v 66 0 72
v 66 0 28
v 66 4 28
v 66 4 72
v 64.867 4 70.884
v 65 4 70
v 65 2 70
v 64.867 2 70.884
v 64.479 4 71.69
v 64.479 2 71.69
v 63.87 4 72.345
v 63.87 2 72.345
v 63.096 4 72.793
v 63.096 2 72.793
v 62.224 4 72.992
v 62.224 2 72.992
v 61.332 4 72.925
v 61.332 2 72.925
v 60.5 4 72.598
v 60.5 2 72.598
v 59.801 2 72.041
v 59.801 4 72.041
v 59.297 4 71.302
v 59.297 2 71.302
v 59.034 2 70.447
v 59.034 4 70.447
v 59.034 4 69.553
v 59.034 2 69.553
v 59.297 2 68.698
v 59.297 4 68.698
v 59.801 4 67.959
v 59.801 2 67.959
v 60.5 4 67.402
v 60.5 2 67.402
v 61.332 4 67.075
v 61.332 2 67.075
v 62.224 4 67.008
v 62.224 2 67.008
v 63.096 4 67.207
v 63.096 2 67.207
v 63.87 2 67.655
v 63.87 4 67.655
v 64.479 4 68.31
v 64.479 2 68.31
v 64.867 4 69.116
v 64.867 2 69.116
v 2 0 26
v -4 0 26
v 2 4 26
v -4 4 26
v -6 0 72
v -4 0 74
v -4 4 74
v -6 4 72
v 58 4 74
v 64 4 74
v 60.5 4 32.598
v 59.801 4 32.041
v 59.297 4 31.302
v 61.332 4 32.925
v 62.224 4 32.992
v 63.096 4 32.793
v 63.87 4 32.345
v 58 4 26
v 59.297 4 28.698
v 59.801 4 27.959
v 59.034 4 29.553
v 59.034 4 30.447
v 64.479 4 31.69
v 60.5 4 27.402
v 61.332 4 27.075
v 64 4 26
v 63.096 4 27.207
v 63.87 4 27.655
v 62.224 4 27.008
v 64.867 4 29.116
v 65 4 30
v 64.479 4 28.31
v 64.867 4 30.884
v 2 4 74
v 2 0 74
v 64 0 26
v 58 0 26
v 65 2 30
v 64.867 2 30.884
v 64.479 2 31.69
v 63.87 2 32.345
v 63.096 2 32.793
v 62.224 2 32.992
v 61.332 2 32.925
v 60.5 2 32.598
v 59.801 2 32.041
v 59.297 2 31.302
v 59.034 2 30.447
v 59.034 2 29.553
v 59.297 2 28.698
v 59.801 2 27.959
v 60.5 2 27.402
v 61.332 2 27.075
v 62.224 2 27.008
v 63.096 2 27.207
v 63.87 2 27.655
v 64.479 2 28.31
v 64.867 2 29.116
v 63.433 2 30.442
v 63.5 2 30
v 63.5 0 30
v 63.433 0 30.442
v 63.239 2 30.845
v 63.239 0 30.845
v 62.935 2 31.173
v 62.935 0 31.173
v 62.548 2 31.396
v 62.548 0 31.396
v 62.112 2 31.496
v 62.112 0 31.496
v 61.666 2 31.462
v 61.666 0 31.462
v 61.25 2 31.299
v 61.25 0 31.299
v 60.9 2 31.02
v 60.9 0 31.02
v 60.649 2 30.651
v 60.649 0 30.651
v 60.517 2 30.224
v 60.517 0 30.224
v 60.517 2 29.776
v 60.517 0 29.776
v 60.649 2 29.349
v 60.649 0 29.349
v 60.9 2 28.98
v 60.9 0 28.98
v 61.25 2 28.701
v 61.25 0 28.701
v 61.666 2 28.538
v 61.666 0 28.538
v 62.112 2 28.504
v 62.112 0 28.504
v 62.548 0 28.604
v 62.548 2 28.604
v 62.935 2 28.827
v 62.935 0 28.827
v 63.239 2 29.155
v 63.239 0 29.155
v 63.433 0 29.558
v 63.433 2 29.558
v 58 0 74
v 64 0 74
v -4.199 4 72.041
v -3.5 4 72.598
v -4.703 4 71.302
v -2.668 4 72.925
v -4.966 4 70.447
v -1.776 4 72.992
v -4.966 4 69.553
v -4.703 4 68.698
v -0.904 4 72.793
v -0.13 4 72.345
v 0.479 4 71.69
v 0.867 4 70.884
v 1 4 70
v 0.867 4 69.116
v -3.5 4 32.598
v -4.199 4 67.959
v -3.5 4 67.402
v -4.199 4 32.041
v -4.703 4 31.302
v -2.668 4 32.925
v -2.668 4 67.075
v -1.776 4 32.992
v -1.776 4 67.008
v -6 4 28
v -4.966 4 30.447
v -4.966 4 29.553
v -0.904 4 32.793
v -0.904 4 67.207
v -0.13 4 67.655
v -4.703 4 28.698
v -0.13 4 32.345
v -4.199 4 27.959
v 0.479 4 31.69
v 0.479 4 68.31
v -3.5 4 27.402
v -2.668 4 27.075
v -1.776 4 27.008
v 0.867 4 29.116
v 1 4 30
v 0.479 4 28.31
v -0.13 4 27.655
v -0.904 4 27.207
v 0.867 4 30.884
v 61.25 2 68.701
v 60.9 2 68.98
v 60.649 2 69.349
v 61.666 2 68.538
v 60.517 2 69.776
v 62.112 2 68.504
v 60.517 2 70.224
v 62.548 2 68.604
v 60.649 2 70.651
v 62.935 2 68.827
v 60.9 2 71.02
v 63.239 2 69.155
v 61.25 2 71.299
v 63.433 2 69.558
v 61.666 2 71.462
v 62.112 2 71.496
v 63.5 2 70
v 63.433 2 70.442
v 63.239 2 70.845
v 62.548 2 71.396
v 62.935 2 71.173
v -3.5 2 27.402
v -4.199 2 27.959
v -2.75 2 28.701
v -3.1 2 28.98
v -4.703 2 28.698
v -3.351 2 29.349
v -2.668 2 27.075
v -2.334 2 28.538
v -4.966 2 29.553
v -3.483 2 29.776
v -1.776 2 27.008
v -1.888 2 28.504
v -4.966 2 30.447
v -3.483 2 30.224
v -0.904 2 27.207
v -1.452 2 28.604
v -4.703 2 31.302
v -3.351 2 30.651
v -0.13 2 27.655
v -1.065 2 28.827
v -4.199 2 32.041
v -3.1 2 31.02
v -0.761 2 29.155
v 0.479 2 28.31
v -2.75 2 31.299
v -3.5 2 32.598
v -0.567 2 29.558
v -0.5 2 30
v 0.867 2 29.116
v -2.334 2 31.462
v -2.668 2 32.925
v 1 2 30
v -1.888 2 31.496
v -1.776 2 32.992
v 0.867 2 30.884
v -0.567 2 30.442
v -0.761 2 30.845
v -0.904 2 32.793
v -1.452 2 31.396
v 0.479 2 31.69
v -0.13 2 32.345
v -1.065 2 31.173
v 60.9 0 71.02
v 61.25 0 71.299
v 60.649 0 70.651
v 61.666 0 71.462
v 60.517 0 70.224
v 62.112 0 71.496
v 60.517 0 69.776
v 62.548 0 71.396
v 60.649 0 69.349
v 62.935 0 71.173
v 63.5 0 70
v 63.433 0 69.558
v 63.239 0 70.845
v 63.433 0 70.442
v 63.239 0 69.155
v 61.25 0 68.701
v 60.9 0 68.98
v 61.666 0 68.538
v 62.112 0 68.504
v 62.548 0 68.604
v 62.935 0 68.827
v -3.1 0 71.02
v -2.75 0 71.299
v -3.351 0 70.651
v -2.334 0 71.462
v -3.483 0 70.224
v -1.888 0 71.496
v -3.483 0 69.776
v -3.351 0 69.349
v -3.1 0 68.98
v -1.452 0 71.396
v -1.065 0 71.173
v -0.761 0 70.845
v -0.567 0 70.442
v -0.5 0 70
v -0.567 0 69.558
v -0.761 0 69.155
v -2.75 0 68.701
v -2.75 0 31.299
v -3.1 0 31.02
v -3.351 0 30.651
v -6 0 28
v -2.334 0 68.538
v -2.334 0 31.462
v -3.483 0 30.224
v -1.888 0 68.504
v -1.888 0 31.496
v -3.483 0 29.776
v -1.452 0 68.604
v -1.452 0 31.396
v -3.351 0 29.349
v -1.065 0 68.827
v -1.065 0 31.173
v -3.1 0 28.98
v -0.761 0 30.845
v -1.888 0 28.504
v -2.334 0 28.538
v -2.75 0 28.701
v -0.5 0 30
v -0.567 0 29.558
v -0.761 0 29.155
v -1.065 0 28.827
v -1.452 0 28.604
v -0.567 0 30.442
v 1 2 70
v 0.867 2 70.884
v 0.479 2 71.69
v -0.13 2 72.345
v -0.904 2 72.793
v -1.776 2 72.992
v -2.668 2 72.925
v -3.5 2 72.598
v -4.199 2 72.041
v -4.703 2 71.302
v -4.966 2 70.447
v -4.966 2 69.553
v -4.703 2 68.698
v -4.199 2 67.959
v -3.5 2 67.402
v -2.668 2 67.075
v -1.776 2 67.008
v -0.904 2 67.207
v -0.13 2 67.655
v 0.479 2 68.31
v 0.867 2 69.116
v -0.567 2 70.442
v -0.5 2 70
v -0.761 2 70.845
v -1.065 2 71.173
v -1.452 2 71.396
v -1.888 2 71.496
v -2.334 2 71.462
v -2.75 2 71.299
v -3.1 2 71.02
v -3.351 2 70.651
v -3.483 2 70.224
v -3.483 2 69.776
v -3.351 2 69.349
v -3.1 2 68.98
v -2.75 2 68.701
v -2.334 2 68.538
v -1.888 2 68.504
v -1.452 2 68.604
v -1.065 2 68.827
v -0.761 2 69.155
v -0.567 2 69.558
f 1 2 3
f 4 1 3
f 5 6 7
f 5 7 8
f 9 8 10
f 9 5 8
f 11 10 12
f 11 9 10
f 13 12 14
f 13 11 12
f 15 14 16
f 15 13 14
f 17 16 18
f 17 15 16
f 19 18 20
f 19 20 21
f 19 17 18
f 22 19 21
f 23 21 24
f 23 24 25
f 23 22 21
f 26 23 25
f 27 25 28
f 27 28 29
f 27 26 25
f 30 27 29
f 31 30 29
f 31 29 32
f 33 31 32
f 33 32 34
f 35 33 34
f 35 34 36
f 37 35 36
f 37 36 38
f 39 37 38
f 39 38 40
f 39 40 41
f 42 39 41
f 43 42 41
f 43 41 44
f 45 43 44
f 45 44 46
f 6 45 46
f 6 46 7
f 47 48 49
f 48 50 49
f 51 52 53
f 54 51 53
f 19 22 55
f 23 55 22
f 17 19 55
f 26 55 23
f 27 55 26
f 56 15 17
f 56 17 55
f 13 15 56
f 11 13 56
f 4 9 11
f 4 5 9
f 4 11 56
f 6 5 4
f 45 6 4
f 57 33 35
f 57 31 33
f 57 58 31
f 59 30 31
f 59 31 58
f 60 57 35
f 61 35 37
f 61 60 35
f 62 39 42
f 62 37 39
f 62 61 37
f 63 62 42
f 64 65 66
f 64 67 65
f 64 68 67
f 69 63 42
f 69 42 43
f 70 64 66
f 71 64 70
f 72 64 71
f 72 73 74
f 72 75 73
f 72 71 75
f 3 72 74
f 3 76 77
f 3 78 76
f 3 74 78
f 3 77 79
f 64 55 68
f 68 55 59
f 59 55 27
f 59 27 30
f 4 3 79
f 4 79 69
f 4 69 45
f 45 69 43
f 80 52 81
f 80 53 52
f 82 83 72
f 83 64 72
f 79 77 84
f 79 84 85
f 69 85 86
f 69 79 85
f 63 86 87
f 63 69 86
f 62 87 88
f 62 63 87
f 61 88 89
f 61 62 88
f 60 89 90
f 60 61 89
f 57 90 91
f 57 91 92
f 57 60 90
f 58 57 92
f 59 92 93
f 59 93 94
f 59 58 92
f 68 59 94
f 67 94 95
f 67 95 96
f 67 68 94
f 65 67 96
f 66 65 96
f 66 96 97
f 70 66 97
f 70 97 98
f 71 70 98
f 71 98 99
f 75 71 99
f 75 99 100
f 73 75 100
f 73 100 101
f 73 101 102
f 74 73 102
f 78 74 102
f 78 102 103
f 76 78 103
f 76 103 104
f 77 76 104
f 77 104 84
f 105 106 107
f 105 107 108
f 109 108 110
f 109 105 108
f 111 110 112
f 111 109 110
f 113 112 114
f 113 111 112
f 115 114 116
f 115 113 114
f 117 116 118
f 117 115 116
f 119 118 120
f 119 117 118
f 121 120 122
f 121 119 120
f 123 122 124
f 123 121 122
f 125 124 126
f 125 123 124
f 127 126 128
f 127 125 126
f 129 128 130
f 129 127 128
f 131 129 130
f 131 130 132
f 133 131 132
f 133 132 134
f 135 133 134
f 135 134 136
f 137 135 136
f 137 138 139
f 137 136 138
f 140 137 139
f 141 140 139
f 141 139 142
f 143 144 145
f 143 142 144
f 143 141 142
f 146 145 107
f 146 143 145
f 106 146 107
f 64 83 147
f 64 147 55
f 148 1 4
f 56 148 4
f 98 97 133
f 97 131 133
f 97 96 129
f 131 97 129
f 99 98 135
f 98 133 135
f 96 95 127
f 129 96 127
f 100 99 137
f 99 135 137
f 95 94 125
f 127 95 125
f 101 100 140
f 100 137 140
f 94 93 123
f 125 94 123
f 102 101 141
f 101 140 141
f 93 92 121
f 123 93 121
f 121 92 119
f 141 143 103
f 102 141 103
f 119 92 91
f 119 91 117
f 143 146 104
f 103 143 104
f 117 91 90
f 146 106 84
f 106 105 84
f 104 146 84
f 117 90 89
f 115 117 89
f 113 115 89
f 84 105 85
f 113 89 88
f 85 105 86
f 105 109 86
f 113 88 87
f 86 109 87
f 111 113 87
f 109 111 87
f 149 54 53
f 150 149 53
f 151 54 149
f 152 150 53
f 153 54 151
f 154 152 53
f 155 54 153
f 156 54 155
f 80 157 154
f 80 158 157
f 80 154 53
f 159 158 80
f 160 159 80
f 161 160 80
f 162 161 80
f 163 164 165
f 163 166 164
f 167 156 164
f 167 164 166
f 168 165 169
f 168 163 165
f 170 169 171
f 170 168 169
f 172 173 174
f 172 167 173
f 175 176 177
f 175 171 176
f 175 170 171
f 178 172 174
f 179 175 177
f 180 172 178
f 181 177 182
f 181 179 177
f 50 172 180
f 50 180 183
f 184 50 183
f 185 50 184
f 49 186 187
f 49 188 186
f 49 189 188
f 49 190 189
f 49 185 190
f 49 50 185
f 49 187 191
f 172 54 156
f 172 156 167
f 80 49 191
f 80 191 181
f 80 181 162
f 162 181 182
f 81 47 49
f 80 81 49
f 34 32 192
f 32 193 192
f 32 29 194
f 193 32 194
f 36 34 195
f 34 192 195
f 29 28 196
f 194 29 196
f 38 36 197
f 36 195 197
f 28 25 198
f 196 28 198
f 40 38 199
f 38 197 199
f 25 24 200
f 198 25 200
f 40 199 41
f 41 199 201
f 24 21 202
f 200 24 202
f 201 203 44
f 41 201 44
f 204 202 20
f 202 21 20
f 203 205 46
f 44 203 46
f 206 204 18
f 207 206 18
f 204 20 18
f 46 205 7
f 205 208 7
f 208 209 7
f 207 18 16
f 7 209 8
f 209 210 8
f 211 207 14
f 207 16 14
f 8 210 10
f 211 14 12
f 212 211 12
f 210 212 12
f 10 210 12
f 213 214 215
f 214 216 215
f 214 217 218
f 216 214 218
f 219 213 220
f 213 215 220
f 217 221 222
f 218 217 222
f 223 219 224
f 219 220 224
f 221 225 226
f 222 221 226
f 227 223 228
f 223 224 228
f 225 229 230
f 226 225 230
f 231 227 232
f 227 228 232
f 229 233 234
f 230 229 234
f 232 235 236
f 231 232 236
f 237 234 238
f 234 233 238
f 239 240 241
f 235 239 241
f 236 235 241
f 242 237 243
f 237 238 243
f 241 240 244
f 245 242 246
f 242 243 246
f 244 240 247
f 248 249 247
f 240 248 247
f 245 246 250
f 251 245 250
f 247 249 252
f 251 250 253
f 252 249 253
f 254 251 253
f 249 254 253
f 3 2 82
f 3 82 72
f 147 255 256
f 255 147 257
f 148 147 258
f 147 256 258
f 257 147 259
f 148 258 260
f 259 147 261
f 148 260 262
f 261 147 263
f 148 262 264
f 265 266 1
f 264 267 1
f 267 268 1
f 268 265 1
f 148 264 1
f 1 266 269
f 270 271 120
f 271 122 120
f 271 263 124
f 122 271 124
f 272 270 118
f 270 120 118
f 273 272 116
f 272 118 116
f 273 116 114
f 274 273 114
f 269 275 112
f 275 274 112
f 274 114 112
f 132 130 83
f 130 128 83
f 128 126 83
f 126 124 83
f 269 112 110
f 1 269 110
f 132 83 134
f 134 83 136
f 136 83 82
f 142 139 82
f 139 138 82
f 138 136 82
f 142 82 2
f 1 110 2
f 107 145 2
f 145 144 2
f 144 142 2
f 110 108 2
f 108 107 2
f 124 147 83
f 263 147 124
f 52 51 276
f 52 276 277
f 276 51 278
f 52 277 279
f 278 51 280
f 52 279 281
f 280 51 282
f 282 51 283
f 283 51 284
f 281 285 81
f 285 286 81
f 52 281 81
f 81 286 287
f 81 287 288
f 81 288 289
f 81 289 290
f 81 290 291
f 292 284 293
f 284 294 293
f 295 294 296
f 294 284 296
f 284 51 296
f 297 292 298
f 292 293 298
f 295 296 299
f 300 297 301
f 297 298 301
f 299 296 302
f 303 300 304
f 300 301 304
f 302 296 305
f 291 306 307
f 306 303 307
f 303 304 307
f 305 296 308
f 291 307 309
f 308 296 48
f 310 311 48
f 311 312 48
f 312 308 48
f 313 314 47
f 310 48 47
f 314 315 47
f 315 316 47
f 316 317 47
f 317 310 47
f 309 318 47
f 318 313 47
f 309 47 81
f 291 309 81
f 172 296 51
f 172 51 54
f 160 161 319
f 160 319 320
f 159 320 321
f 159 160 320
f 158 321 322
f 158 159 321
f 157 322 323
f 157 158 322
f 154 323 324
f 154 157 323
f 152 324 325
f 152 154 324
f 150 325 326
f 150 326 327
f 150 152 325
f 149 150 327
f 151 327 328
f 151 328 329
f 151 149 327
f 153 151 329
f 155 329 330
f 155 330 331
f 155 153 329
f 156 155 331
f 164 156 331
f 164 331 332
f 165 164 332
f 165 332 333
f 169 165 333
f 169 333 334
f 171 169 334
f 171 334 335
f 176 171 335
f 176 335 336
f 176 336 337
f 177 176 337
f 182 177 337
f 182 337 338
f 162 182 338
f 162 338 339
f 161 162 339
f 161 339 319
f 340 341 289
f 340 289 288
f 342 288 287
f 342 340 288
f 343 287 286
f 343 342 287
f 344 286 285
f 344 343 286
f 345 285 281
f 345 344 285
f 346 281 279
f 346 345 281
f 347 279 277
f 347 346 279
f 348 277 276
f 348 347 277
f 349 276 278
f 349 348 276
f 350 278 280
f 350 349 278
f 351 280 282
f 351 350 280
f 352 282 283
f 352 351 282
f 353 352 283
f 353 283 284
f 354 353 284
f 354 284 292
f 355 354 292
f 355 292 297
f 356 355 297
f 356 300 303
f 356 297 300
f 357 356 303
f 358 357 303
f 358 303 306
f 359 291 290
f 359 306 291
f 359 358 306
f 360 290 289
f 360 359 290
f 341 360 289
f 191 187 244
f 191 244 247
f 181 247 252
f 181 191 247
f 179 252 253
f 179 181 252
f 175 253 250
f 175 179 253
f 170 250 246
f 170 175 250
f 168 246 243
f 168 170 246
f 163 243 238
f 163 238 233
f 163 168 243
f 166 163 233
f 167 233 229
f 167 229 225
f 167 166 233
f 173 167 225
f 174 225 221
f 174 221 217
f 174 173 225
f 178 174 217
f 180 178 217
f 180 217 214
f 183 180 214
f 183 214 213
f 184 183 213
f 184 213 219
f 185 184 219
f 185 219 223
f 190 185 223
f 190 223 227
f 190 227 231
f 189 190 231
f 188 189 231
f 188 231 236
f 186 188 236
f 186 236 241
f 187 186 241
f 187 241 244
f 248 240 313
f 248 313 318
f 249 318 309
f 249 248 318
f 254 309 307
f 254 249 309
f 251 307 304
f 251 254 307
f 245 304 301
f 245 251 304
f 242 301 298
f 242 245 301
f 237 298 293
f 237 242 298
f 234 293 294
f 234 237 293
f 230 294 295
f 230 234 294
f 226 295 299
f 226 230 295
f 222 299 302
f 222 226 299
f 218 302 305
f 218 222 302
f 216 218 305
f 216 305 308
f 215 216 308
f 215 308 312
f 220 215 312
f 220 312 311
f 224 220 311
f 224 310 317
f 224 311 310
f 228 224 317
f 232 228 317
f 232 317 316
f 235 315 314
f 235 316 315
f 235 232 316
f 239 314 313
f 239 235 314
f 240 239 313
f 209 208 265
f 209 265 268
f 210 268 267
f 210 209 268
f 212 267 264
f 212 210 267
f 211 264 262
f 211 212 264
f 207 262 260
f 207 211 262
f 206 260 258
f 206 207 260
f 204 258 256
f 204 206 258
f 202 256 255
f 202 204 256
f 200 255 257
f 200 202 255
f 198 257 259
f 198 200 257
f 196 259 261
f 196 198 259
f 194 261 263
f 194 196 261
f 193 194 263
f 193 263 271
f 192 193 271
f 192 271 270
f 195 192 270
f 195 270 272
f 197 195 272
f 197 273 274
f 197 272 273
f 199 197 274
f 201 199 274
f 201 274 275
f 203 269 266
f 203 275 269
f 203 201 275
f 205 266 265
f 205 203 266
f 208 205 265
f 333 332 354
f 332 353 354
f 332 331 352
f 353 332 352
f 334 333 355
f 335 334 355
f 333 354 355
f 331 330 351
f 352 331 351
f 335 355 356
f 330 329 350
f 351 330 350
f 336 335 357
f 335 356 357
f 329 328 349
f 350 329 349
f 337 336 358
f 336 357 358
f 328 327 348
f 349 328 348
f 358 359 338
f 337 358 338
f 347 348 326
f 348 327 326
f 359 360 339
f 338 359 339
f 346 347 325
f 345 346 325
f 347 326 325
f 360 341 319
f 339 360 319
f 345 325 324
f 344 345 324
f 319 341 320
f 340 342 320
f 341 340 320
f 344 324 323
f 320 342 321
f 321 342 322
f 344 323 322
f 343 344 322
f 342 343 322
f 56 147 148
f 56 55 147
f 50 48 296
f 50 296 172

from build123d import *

# Parameters (mm, degrees)
CYLINDER887_R     = 3
CYLINDER887_DEPTH = 3
CYLINDER882_R     = 3
CYLINDER882_DEPTH = 3
CYLINDER883_R     = 3
CYLINDER883_DEPTH = 3
CYLINDER886_R     = 3
CYLINDER886_DEPTH = 3
CYLINDER885_R     = 1.5
CYLINDER885_DEPTH = 10
CYLINDER888_R     = 1.5
CYLINDER888_DEPTH = 10
CYLINDER889_R     = 1.5
CYLINDER889_DEPTH = 10
CYLINDER884_R     = 1.5
CYLINDER884_DEPTH = 10
BOX427_W          = 8
BOX427_H          = 4
BOX427_DEPTH      = 48
BOX426_W          = 8
BOX426_H          = 4
BOX426_DEPTH      = 48
CHAMFER026_SIZE   = 2
CHAMFER027_SIZE   = 2


with BuildPart() as v_lec887:
    # Cylinder887 → Cylinder887 (new body)
    with BuildSketch(Plane(origin=(62, 4, 70), x_dir=(1, 0, 0), z_dir=(0, -1, 0))):
        Circle(CYLINDER887_R)
    extrude(amount=CYLINDER887_DEPTH)


with BuildPart() as v_lec882:
    # Cylinder882 → Cylinder882 (new body)
    with BuildSketch(Plane(origin=(-2, 4, 30), x_dir=(1, 0, 0), z_dir=(0, -1, 0))):
        Circle(CYLINDER882_R)
    extrude(amount=CYLINDER882_DEPTH)


with BuildPart() as v_lec883:
    # Cylinder883 → Cylinder883 (new body)
    with BuildSketch(Plane(origin=(-2, 4, 70), x_dir=(1, 0, 0), z_dir=(0, -1, 0))):
        Circle(CYLINDER883_R)
    extrude(amount=CYLINDER883_DEPTH)


with BuildPart() as compound506:
    # Cylinder886 → Cylinder886 (new body)
    with BuildSketch(Plane(origin=(62, 4, 30), x_dir=(1, 0, 0), z_dir=(0, -1, 0))):
        Circle(CYLINDER886_R)
    extrude(amount=CYLINDER886_DEPTH)

    # Compound506: union Válec887, Válec882, Válec883
    add(v_lec887.part)
    add(v_lec882.part)
    add(v_lec883.part)


with BuildPart() as compound506_1:
    # Compound506 placement: moved
    add(compound506.part.moved(Location((0, 1, 0))))


with BuildPart() as v_lec885:
    # Cylinder885 → Cylinder885 (new body)
    with BuildSketch(Plane(origin=(-2, 4, 70), x_dir=(1, 0, 0), z_dir=(0, -1, 0))):
        Circle(CYLINDER885_R)
    extrude(amount=CYLINDER885_DEPTH)


with BuildPart() as v_lec888:
    # Cylinder888 → Cylinder888 (new body)
    with BuildSketch(Plane(origin=(62, 4, 30), x_dir=(1, 0, 0), z_dir=(0, -1, 0))):
        Circle(CYLINDER888_R)
    extrude(amount=CYLINDER888_DEPTH)


with BuildPart() as v_lec889:
    # Cylinder889 → Cylinder889 (new body)
    with BuildSketch(Plane(origin=(62, 4, 70), x_dir=(1, 0, 0), z_dir=(0, -1, 0))):
        Circle(CYLINDER889_R)
    extrude(amount=CYLINDER889_DEPTH)


with BuildPart() as compound507:
    # Cylinder884 → Cylinder884 (new body)
    with BuildSketch(Plane(origin=(-2, 4, 30), x_dir=(1, 0, 0), z_dir=(0, -1, 0))):
        Circle(CYLINDER884_R)
    extrude(amount=CYLINDER884_DEPTH)

    # Compound507: union Válec885, Válec888, Válec889
    add(v_lec885.part)
    add(v_lec888.part)
    add(v_lec889.part)


with BuildPart() as krychle427:
    # Box427 → Box427 (new body)
    with BuildSketch(Plane(origin=(58, 0, 26), x_dir=(1, 0, 0), z_dir=(0, 0, 1))):
        with Locations((4, 2)):
            Rectangle(BOX427_W, BOX427_H)
    extrude(amount=BOX427_DEPTH)


with BuildPart() as chamfer027:
    # Box426 → Box426 (new body)
    with BuildSketch(Plane(origin=(-6, 0, 26), x_dir=(1, 0, 0), z_dir=(0, 0, 1))):
        with Locations((4, 2)):
            Rectangle(BOX426_W, BOX426_H)
    extrude(amount=BOX426_DEPTH)

    # Compound505: union Krychle427
    add(krychle427.part)

    # Cut024: cut Compound507
    add(compound507.part, mode=Mode.SUBTRACT)

    # Cut025: cut Compound506
    add(compound506_1.part, mode=Mode.SUBTRACT)

    # Chamfer026
    chamfer026_edges = [chamfer027.edges().sort_by_distance(p)[0] for p in [
        (66, 2, 74),
        (66, 2, 26),
    ]]
    chamfer(chamfer026_edges, length=CHAMFER026_SIZE)

    # Chamfer027
    chamfer027_edges = [chamfer027.edges().sort_by_distance(p)[0] for p in [
        (-6, 2, 74),
        (-6, 2, 26),
    ]]
    chamfer(chamfer027_edges, length=CHAMFER027_SIZE)


solid = chamfer027.part
